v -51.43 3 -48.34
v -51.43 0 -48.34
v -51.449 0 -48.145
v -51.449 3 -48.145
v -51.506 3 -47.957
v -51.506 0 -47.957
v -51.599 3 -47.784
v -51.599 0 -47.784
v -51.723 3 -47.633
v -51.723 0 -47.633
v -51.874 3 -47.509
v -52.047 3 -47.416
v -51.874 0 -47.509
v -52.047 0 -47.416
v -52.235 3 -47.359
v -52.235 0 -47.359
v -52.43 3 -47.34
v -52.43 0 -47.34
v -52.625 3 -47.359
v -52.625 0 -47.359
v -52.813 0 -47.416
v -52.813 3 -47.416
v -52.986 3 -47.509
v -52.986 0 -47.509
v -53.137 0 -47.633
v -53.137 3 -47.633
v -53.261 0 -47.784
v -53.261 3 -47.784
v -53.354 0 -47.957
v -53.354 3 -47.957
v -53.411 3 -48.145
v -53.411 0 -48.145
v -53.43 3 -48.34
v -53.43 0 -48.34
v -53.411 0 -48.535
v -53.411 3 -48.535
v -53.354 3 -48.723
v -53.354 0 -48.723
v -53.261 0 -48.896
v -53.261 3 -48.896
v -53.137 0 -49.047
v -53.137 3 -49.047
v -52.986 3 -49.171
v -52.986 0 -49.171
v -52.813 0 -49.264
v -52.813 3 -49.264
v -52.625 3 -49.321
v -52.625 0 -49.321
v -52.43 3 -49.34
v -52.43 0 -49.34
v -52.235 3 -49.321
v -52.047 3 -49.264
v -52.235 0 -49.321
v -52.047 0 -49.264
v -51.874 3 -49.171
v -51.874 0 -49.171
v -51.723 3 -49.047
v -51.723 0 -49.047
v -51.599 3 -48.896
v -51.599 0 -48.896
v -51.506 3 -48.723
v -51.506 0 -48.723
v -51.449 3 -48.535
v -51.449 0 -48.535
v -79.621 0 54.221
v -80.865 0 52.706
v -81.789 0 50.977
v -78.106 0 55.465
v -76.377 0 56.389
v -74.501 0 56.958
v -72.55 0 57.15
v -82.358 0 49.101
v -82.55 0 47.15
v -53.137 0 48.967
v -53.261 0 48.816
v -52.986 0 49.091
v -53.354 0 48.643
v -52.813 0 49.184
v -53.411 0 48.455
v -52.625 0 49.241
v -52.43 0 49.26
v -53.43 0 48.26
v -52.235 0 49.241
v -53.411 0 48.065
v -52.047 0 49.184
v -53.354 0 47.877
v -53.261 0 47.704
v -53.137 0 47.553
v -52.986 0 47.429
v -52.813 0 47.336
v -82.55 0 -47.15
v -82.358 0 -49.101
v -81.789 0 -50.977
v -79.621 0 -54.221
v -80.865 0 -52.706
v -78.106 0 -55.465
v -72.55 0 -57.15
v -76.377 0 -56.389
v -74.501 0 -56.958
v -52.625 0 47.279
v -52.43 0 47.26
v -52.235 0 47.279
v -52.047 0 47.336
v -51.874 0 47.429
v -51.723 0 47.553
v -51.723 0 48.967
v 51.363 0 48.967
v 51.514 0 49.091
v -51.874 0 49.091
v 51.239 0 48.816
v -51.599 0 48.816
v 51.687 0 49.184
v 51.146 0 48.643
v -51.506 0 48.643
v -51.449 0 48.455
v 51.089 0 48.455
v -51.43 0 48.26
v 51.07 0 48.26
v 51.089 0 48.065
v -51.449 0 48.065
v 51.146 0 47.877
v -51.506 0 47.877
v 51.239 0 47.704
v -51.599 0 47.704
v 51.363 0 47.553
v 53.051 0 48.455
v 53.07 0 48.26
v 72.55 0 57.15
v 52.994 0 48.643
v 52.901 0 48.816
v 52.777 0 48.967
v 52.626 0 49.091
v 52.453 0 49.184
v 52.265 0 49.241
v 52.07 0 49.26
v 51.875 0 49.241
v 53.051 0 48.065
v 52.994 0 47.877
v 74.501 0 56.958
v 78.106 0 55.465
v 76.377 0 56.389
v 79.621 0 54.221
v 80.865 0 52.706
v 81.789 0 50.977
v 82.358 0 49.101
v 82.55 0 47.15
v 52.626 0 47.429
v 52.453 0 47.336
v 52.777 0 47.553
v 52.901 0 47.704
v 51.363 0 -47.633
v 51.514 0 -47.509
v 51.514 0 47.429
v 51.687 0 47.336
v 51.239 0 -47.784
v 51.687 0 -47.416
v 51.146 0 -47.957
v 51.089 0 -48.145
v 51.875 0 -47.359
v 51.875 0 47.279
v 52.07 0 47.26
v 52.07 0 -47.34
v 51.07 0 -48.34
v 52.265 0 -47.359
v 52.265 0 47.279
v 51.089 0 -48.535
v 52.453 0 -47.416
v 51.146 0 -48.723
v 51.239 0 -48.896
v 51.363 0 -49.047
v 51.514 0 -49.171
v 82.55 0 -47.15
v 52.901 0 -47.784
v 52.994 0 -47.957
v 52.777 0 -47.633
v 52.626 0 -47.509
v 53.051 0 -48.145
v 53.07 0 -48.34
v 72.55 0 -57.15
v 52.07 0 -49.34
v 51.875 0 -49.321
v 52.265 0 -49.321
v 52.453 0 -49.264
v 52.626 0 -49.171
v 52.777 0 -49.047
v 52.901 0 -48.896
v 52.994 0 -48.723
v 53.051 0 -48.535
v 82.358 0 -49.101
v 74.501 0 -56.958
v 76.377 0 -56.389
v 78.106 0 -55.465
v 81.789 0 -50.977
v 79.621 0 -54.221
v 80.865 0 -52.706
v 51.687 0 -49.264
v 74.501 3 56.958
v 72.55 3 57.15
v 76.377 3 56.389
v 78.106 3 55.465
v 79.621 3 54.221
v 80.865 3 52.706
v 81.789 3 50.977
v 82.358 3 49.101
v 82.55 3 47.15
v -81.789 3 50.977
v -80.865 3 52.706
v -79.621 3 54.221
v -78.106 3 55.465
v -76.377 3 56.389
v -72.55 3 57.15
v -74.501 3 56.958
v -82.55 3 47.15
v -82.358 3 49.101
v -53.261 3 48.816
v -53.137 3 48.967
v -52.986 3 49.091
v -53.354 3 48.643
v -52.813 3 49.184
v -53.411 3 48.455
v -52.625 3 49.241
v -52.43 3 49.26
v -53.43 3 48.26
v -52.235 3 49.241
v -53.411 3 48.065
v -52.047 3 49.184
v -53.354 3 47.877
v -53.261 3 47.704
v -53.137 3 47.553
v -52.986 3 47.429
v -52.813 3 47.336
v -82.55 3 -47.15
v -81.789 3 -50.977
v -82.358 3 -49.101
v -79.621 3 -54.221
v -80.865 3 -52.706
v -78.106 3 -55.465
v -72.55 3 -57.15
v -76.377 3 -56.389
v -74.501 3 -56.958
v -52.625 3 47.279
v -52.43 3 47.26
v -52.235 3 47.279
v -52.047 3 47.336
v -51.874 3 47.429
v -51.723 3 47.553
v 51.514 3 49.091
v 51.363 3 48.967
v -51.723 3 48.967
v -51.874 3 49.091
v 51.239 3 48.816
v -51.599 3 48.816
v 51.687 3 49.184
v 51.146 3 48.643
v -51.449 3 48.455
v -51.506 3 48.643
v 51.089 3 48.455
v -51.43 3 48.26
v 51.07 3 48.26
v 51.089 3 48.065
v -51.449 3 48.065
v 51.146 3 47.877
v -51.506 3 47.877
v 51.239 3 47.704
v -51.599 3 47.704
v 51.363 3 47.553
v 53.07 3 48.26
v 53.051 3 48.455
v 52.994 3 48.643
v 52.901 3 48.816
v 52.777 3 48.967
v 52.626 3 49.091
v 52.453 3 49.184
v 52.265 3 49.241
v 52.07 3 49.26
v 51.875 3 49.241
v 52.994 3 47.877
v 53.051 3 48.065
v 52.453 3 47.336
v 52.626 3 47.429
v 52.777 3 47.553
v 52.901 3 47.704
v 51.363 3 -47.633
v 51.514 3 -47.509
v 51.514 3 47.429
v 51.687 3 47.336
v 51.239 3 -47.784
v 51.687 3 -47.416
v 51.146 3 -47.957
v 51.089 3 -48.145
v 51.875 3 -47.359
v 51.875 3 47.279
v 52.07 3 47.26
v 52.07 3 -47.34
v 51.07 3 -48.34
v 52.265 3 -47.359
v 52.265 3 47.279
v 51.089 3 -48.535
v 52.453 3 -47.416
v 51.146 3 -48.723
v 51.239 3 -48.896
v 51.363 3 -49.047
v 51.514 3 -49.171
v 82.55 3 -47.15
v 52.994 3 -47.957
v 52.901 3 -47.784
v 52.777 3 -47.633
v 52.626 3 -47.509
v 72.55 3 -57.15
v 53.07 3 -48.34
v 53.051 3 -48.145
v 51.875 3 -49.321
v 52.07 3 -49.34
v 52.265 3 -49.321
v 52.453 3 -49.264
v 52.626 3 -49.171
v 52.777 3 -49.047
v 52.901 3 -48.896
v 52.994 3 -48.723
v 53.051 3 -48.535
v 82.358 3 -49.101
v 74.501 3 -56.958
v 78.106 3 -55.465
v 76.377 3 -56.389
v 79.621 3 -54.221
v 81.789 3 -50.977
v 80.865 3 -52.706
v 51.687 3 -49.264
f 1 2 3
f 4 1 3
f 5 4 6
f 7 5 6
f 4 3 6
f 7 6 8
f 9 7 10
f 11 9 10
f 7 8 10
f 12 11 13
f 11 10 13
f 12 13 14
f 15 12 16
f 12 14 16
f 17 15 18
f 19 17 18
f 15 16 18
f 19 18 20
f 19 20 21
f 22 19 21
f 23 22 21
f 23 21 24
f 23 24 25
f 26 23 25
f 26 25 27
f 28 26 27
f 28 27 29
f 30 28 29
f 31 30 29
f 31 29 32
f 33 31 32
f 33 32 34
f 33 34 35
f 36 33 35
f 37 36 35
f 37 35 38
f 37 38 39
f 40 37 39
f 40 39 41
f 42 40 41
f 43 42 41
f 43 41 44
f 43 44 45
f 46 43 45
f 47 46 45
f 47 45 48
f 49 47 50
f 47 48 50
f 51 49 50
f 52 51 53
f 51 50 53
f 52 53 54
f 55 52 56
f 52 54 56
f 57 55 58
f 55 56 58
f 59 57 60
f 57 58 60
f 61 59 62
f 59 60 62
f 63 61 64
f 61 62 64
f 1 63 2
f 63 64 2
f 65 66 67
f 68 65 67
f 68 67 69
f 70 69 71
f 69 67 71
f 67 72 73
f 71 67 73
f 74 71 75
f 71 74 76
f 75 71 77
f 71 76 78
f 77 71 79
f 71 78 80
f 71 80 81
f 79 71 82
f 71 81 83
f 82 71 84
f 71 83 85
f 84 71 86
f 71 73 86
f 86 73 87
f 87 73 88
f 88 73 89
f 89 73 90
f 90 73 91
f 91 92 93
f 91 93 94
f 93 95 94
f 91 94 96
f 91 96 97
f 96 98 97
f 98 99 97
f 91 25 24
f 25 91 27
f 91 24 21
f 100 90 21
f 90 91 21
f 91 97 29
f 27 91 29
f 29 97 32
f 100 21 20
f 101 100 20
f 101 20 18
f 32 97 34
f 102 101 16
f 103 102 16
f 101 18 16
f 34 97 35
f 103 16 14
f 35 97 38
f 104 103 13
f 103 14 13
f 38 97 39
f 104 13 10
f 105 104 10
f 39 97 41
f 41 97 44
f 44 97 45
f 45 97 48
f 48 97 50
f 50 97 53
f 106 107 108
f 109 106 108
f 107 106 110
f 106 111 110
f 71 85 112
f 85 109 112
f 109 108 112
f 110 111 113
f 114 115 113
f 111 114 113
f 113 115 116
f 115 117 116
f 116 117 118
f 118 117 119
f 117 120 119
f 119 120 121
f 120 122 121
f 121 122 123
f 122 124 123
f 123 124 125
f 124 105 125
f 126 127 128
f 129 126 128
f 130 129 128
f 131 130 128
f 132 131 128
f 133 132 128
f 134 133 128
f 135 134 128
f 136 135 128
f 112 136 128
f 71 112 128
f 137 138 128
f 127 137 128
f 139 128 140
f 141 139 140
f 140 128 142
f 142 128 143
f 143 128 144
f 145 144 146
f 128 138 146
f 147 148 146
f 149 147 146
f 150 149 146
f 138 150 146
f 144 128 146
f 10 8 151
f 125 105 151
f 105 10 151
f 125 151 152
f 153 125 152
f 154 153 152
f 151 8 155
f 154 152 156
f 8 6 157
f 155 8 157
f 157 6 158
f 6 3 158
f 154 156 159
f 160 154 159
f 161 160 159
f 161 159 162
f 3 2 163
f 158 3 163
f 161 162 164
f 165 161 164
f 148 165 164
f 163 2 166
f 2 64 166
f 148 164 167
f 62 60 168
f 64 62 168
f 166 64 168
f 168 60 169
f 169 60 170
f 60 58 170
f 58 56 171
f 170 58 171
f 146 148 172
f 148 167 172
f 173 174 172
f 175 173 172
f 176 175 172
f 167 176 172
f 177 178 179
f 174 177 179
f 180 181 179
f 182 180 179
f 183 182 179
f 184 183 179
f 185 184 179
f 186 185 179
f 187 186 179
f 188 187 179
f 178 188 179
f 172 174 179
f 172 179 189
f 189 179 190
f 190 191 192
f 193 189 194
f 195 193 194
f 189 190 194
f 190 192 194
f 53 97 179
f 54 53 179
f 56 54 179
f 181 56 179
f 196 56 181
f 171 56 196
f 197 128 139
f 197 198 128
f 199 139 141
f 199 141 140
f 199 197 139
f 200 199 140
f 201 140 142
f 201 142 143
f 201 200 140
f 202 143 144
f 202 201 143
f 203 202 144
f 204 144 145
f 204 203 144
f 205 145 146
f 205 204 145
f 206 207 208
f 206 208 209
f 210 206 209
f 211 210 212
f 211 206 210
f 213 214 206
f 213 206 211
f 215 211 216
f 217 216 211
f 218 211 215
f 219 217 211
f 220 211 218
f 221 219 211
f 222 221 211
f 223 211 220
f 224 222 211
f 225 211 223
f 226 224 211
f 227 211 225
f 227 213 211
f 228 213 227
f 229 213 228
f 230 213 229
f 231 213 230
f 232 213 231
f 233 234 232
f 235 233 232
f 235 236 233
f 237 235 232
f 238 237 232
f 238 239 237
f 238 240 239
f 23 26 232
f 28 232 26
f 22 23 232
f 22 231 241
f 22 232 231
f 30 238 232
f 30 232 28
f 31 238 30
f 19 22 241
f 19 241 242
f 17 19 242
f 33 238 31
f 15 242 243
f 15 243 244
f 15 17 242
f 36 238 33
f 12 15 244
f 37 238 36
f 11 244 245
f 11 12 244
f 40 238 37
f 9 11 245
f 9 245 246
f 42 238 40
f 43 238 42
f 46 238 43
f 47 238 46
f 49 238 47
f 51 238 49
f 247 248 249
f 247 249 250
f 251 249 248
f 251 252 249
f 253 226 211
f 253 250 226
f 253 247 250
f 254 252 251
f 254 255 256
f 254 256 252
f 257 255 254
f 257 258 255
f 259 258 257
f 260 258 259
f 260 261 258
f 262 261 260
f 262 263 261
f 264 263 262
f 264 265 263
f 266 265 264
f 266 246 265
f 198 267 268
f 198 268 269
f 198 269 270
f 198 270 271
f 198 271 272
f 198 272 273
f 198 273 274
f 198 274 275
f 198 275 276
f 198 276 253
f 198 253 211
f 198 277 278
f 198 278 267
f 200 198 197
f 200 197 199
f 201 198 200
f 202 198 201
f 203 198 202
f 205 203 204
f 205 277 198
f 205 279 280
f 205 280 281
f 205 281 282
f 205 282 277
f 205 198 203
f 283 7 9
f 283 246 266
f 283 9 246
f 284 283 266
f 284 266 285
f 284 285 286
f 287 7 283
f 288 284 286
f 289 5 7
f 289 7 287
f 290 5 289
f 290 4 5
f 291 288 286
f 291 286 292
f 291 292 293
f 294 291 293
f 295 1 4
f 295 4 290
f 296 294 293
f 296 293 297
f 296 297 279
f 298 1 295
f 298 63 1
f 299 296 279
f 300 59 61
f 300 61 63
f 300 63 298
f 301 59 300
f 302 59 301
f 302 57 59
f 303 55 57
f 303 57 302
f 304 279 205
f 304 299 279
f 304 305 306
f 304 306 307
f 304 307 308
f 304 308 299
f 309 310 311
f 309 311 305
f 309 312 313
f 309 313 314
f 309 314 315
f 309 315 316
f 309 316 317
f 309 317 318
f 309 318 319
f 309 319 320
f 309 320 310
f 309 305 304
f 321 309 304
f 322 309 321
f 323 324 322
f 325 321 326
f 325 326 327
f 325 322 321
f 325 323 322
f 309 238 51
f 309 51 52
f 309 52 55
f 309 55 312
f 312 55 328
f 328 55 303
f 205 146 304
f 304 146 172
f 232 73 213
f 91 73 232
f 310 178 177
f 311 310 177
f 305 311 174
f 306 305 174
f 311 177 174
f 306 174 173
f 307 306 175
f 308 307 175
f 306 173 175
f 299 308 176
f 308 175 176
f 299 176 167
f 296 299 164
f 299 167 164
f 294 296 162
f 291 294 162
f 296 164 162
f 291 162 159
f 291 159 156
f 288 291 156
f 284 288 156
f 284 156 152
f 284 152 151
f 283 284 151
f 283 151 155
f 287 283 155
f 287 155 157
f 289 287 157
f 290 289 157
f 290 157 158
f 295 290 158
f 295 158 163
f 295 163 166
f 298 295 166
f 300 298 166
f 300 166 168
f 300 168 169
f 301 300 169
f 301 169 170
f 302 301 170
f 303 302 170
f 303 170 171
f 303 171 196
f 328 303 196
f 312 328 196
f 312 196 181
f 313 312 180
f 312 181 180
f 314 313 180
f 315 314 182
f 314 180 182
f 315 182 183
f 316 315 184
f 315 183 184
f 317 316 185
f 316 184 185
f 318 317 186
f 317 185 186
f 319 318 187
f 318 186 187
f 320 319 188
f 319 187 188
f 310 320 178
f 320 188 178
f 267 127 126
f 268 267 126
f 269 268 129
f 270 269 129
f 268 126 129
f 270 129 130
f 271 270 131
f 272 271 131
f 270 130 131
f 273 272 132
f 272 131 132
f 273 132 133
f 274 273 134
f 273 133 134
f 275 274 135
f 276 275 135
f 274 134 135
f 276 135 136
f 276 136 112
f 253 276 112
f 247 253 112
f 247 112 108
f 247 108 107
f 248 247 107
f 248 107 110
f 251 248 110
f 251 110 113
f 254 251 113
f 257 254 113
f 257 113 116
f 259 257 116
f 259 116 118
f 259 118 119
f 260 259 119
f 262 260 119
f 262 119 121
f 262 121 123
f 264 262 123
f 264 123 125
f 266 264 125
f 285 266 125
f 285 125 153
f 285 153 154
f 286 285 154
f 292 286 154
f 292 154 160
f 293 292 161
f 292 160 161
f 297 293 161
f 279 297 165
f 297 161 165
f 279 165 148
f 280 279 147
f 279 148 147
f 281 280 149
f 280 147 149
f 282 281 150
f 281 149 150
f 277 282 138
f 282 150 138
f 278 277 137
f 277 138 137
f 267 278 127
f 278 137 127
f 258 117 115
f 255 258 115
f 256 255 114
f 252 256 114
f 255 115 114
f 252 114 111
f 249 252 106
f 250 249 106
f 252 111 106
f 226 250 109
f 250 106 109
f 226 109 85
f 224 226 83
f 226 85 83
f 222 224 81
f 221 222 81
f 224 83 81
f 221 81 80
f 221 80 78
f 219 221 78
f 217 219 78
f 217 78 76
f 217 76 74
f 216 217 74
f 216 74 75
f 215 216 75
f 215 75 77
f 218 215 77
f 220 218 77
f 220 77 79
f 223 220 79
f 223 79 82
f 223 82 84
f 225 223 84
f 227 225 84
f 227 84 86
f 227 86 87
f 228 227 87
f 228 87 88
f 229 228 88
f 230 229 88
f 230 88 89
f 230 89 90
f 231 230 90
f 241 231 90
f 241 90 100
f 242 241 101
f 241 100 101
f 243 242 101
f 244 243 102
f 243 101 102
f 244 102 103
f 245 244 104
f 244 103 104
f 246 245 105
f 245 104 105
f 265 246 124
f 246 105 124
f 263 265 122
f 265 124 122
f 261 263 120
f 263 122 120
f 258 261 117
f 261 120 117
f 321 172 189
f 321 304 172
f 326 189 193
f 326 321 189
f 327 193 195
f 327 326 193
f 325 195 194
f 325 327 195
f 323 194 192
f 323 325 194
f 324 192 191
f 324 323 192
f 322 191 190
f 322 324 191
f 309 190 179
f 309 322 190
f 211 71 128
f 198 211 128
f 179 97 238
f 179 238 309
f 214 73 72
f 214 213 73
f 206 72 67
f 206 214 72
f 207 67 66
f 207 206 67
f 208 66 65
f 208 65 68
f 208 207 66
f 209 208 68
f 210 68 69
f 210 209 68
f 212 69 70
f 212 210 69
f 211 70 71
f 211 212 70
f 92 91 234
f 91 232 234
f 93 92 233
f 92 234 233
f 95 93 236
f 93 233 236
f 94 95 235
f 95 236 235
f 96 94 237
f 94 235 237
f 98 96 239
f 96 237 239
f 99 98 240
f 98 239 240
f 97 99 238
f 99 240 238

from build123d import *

# Parameters (mm, degrees)
SKETCH1_W           = 165.1
SKETCH1_H           = 114.3
BOSS_EXTRUDE1_DEPTH = 3
FILLET1_R           = 10
SKETCH2_R           = 1
CUT_EXTRUDE1_DEPTH  = 4


with BuildPart() as part:
    # Sketch1 → Boss-Extrude1 (new body)
    with BuildSketch(Plane(origin=(0, 0, 0), x_dir=(1, 0, 0), z_dir=(0, 1, 0))):
        Rectangle(SKETCH1_W, SKETCH1_H)
    extrude(amount=BOSS_EXTRUDE1_DEPTH)

    # Fillet1
    fillet1_edges = [part.edges().sort_by_distance(p)[0] for p in [
        (82.55, 1.5, 57.15),
        (-82.55, 1.5, 57.15),
        (-82.55, 1.5, -57.15),
        (82.55, 1.5, -57.15),
    ]]
    fillet(fillet1_edges, radius=FILLET1_R)

    # Sketch2 → Cut-Extrude1 (cut, through all)
    with BuildSketch(Plane.XZ):
        with Locations((-52.43, 48.26)):
            Circle(SKETCH2_R)
        with Locations((-52.43, -48.34)):
            Circle(SKETCH2_R)
        with Locations((52.07, 48.26)):
            Circle(SKETCH2_R)
        with Locations((52.07, -48.34)):
            Circle(SKETCH2_R)
    extrude(amount=-CUT_EXTRUDE1_DEPTH, mode=Mode.SUBTRACT)


solid = part.part
